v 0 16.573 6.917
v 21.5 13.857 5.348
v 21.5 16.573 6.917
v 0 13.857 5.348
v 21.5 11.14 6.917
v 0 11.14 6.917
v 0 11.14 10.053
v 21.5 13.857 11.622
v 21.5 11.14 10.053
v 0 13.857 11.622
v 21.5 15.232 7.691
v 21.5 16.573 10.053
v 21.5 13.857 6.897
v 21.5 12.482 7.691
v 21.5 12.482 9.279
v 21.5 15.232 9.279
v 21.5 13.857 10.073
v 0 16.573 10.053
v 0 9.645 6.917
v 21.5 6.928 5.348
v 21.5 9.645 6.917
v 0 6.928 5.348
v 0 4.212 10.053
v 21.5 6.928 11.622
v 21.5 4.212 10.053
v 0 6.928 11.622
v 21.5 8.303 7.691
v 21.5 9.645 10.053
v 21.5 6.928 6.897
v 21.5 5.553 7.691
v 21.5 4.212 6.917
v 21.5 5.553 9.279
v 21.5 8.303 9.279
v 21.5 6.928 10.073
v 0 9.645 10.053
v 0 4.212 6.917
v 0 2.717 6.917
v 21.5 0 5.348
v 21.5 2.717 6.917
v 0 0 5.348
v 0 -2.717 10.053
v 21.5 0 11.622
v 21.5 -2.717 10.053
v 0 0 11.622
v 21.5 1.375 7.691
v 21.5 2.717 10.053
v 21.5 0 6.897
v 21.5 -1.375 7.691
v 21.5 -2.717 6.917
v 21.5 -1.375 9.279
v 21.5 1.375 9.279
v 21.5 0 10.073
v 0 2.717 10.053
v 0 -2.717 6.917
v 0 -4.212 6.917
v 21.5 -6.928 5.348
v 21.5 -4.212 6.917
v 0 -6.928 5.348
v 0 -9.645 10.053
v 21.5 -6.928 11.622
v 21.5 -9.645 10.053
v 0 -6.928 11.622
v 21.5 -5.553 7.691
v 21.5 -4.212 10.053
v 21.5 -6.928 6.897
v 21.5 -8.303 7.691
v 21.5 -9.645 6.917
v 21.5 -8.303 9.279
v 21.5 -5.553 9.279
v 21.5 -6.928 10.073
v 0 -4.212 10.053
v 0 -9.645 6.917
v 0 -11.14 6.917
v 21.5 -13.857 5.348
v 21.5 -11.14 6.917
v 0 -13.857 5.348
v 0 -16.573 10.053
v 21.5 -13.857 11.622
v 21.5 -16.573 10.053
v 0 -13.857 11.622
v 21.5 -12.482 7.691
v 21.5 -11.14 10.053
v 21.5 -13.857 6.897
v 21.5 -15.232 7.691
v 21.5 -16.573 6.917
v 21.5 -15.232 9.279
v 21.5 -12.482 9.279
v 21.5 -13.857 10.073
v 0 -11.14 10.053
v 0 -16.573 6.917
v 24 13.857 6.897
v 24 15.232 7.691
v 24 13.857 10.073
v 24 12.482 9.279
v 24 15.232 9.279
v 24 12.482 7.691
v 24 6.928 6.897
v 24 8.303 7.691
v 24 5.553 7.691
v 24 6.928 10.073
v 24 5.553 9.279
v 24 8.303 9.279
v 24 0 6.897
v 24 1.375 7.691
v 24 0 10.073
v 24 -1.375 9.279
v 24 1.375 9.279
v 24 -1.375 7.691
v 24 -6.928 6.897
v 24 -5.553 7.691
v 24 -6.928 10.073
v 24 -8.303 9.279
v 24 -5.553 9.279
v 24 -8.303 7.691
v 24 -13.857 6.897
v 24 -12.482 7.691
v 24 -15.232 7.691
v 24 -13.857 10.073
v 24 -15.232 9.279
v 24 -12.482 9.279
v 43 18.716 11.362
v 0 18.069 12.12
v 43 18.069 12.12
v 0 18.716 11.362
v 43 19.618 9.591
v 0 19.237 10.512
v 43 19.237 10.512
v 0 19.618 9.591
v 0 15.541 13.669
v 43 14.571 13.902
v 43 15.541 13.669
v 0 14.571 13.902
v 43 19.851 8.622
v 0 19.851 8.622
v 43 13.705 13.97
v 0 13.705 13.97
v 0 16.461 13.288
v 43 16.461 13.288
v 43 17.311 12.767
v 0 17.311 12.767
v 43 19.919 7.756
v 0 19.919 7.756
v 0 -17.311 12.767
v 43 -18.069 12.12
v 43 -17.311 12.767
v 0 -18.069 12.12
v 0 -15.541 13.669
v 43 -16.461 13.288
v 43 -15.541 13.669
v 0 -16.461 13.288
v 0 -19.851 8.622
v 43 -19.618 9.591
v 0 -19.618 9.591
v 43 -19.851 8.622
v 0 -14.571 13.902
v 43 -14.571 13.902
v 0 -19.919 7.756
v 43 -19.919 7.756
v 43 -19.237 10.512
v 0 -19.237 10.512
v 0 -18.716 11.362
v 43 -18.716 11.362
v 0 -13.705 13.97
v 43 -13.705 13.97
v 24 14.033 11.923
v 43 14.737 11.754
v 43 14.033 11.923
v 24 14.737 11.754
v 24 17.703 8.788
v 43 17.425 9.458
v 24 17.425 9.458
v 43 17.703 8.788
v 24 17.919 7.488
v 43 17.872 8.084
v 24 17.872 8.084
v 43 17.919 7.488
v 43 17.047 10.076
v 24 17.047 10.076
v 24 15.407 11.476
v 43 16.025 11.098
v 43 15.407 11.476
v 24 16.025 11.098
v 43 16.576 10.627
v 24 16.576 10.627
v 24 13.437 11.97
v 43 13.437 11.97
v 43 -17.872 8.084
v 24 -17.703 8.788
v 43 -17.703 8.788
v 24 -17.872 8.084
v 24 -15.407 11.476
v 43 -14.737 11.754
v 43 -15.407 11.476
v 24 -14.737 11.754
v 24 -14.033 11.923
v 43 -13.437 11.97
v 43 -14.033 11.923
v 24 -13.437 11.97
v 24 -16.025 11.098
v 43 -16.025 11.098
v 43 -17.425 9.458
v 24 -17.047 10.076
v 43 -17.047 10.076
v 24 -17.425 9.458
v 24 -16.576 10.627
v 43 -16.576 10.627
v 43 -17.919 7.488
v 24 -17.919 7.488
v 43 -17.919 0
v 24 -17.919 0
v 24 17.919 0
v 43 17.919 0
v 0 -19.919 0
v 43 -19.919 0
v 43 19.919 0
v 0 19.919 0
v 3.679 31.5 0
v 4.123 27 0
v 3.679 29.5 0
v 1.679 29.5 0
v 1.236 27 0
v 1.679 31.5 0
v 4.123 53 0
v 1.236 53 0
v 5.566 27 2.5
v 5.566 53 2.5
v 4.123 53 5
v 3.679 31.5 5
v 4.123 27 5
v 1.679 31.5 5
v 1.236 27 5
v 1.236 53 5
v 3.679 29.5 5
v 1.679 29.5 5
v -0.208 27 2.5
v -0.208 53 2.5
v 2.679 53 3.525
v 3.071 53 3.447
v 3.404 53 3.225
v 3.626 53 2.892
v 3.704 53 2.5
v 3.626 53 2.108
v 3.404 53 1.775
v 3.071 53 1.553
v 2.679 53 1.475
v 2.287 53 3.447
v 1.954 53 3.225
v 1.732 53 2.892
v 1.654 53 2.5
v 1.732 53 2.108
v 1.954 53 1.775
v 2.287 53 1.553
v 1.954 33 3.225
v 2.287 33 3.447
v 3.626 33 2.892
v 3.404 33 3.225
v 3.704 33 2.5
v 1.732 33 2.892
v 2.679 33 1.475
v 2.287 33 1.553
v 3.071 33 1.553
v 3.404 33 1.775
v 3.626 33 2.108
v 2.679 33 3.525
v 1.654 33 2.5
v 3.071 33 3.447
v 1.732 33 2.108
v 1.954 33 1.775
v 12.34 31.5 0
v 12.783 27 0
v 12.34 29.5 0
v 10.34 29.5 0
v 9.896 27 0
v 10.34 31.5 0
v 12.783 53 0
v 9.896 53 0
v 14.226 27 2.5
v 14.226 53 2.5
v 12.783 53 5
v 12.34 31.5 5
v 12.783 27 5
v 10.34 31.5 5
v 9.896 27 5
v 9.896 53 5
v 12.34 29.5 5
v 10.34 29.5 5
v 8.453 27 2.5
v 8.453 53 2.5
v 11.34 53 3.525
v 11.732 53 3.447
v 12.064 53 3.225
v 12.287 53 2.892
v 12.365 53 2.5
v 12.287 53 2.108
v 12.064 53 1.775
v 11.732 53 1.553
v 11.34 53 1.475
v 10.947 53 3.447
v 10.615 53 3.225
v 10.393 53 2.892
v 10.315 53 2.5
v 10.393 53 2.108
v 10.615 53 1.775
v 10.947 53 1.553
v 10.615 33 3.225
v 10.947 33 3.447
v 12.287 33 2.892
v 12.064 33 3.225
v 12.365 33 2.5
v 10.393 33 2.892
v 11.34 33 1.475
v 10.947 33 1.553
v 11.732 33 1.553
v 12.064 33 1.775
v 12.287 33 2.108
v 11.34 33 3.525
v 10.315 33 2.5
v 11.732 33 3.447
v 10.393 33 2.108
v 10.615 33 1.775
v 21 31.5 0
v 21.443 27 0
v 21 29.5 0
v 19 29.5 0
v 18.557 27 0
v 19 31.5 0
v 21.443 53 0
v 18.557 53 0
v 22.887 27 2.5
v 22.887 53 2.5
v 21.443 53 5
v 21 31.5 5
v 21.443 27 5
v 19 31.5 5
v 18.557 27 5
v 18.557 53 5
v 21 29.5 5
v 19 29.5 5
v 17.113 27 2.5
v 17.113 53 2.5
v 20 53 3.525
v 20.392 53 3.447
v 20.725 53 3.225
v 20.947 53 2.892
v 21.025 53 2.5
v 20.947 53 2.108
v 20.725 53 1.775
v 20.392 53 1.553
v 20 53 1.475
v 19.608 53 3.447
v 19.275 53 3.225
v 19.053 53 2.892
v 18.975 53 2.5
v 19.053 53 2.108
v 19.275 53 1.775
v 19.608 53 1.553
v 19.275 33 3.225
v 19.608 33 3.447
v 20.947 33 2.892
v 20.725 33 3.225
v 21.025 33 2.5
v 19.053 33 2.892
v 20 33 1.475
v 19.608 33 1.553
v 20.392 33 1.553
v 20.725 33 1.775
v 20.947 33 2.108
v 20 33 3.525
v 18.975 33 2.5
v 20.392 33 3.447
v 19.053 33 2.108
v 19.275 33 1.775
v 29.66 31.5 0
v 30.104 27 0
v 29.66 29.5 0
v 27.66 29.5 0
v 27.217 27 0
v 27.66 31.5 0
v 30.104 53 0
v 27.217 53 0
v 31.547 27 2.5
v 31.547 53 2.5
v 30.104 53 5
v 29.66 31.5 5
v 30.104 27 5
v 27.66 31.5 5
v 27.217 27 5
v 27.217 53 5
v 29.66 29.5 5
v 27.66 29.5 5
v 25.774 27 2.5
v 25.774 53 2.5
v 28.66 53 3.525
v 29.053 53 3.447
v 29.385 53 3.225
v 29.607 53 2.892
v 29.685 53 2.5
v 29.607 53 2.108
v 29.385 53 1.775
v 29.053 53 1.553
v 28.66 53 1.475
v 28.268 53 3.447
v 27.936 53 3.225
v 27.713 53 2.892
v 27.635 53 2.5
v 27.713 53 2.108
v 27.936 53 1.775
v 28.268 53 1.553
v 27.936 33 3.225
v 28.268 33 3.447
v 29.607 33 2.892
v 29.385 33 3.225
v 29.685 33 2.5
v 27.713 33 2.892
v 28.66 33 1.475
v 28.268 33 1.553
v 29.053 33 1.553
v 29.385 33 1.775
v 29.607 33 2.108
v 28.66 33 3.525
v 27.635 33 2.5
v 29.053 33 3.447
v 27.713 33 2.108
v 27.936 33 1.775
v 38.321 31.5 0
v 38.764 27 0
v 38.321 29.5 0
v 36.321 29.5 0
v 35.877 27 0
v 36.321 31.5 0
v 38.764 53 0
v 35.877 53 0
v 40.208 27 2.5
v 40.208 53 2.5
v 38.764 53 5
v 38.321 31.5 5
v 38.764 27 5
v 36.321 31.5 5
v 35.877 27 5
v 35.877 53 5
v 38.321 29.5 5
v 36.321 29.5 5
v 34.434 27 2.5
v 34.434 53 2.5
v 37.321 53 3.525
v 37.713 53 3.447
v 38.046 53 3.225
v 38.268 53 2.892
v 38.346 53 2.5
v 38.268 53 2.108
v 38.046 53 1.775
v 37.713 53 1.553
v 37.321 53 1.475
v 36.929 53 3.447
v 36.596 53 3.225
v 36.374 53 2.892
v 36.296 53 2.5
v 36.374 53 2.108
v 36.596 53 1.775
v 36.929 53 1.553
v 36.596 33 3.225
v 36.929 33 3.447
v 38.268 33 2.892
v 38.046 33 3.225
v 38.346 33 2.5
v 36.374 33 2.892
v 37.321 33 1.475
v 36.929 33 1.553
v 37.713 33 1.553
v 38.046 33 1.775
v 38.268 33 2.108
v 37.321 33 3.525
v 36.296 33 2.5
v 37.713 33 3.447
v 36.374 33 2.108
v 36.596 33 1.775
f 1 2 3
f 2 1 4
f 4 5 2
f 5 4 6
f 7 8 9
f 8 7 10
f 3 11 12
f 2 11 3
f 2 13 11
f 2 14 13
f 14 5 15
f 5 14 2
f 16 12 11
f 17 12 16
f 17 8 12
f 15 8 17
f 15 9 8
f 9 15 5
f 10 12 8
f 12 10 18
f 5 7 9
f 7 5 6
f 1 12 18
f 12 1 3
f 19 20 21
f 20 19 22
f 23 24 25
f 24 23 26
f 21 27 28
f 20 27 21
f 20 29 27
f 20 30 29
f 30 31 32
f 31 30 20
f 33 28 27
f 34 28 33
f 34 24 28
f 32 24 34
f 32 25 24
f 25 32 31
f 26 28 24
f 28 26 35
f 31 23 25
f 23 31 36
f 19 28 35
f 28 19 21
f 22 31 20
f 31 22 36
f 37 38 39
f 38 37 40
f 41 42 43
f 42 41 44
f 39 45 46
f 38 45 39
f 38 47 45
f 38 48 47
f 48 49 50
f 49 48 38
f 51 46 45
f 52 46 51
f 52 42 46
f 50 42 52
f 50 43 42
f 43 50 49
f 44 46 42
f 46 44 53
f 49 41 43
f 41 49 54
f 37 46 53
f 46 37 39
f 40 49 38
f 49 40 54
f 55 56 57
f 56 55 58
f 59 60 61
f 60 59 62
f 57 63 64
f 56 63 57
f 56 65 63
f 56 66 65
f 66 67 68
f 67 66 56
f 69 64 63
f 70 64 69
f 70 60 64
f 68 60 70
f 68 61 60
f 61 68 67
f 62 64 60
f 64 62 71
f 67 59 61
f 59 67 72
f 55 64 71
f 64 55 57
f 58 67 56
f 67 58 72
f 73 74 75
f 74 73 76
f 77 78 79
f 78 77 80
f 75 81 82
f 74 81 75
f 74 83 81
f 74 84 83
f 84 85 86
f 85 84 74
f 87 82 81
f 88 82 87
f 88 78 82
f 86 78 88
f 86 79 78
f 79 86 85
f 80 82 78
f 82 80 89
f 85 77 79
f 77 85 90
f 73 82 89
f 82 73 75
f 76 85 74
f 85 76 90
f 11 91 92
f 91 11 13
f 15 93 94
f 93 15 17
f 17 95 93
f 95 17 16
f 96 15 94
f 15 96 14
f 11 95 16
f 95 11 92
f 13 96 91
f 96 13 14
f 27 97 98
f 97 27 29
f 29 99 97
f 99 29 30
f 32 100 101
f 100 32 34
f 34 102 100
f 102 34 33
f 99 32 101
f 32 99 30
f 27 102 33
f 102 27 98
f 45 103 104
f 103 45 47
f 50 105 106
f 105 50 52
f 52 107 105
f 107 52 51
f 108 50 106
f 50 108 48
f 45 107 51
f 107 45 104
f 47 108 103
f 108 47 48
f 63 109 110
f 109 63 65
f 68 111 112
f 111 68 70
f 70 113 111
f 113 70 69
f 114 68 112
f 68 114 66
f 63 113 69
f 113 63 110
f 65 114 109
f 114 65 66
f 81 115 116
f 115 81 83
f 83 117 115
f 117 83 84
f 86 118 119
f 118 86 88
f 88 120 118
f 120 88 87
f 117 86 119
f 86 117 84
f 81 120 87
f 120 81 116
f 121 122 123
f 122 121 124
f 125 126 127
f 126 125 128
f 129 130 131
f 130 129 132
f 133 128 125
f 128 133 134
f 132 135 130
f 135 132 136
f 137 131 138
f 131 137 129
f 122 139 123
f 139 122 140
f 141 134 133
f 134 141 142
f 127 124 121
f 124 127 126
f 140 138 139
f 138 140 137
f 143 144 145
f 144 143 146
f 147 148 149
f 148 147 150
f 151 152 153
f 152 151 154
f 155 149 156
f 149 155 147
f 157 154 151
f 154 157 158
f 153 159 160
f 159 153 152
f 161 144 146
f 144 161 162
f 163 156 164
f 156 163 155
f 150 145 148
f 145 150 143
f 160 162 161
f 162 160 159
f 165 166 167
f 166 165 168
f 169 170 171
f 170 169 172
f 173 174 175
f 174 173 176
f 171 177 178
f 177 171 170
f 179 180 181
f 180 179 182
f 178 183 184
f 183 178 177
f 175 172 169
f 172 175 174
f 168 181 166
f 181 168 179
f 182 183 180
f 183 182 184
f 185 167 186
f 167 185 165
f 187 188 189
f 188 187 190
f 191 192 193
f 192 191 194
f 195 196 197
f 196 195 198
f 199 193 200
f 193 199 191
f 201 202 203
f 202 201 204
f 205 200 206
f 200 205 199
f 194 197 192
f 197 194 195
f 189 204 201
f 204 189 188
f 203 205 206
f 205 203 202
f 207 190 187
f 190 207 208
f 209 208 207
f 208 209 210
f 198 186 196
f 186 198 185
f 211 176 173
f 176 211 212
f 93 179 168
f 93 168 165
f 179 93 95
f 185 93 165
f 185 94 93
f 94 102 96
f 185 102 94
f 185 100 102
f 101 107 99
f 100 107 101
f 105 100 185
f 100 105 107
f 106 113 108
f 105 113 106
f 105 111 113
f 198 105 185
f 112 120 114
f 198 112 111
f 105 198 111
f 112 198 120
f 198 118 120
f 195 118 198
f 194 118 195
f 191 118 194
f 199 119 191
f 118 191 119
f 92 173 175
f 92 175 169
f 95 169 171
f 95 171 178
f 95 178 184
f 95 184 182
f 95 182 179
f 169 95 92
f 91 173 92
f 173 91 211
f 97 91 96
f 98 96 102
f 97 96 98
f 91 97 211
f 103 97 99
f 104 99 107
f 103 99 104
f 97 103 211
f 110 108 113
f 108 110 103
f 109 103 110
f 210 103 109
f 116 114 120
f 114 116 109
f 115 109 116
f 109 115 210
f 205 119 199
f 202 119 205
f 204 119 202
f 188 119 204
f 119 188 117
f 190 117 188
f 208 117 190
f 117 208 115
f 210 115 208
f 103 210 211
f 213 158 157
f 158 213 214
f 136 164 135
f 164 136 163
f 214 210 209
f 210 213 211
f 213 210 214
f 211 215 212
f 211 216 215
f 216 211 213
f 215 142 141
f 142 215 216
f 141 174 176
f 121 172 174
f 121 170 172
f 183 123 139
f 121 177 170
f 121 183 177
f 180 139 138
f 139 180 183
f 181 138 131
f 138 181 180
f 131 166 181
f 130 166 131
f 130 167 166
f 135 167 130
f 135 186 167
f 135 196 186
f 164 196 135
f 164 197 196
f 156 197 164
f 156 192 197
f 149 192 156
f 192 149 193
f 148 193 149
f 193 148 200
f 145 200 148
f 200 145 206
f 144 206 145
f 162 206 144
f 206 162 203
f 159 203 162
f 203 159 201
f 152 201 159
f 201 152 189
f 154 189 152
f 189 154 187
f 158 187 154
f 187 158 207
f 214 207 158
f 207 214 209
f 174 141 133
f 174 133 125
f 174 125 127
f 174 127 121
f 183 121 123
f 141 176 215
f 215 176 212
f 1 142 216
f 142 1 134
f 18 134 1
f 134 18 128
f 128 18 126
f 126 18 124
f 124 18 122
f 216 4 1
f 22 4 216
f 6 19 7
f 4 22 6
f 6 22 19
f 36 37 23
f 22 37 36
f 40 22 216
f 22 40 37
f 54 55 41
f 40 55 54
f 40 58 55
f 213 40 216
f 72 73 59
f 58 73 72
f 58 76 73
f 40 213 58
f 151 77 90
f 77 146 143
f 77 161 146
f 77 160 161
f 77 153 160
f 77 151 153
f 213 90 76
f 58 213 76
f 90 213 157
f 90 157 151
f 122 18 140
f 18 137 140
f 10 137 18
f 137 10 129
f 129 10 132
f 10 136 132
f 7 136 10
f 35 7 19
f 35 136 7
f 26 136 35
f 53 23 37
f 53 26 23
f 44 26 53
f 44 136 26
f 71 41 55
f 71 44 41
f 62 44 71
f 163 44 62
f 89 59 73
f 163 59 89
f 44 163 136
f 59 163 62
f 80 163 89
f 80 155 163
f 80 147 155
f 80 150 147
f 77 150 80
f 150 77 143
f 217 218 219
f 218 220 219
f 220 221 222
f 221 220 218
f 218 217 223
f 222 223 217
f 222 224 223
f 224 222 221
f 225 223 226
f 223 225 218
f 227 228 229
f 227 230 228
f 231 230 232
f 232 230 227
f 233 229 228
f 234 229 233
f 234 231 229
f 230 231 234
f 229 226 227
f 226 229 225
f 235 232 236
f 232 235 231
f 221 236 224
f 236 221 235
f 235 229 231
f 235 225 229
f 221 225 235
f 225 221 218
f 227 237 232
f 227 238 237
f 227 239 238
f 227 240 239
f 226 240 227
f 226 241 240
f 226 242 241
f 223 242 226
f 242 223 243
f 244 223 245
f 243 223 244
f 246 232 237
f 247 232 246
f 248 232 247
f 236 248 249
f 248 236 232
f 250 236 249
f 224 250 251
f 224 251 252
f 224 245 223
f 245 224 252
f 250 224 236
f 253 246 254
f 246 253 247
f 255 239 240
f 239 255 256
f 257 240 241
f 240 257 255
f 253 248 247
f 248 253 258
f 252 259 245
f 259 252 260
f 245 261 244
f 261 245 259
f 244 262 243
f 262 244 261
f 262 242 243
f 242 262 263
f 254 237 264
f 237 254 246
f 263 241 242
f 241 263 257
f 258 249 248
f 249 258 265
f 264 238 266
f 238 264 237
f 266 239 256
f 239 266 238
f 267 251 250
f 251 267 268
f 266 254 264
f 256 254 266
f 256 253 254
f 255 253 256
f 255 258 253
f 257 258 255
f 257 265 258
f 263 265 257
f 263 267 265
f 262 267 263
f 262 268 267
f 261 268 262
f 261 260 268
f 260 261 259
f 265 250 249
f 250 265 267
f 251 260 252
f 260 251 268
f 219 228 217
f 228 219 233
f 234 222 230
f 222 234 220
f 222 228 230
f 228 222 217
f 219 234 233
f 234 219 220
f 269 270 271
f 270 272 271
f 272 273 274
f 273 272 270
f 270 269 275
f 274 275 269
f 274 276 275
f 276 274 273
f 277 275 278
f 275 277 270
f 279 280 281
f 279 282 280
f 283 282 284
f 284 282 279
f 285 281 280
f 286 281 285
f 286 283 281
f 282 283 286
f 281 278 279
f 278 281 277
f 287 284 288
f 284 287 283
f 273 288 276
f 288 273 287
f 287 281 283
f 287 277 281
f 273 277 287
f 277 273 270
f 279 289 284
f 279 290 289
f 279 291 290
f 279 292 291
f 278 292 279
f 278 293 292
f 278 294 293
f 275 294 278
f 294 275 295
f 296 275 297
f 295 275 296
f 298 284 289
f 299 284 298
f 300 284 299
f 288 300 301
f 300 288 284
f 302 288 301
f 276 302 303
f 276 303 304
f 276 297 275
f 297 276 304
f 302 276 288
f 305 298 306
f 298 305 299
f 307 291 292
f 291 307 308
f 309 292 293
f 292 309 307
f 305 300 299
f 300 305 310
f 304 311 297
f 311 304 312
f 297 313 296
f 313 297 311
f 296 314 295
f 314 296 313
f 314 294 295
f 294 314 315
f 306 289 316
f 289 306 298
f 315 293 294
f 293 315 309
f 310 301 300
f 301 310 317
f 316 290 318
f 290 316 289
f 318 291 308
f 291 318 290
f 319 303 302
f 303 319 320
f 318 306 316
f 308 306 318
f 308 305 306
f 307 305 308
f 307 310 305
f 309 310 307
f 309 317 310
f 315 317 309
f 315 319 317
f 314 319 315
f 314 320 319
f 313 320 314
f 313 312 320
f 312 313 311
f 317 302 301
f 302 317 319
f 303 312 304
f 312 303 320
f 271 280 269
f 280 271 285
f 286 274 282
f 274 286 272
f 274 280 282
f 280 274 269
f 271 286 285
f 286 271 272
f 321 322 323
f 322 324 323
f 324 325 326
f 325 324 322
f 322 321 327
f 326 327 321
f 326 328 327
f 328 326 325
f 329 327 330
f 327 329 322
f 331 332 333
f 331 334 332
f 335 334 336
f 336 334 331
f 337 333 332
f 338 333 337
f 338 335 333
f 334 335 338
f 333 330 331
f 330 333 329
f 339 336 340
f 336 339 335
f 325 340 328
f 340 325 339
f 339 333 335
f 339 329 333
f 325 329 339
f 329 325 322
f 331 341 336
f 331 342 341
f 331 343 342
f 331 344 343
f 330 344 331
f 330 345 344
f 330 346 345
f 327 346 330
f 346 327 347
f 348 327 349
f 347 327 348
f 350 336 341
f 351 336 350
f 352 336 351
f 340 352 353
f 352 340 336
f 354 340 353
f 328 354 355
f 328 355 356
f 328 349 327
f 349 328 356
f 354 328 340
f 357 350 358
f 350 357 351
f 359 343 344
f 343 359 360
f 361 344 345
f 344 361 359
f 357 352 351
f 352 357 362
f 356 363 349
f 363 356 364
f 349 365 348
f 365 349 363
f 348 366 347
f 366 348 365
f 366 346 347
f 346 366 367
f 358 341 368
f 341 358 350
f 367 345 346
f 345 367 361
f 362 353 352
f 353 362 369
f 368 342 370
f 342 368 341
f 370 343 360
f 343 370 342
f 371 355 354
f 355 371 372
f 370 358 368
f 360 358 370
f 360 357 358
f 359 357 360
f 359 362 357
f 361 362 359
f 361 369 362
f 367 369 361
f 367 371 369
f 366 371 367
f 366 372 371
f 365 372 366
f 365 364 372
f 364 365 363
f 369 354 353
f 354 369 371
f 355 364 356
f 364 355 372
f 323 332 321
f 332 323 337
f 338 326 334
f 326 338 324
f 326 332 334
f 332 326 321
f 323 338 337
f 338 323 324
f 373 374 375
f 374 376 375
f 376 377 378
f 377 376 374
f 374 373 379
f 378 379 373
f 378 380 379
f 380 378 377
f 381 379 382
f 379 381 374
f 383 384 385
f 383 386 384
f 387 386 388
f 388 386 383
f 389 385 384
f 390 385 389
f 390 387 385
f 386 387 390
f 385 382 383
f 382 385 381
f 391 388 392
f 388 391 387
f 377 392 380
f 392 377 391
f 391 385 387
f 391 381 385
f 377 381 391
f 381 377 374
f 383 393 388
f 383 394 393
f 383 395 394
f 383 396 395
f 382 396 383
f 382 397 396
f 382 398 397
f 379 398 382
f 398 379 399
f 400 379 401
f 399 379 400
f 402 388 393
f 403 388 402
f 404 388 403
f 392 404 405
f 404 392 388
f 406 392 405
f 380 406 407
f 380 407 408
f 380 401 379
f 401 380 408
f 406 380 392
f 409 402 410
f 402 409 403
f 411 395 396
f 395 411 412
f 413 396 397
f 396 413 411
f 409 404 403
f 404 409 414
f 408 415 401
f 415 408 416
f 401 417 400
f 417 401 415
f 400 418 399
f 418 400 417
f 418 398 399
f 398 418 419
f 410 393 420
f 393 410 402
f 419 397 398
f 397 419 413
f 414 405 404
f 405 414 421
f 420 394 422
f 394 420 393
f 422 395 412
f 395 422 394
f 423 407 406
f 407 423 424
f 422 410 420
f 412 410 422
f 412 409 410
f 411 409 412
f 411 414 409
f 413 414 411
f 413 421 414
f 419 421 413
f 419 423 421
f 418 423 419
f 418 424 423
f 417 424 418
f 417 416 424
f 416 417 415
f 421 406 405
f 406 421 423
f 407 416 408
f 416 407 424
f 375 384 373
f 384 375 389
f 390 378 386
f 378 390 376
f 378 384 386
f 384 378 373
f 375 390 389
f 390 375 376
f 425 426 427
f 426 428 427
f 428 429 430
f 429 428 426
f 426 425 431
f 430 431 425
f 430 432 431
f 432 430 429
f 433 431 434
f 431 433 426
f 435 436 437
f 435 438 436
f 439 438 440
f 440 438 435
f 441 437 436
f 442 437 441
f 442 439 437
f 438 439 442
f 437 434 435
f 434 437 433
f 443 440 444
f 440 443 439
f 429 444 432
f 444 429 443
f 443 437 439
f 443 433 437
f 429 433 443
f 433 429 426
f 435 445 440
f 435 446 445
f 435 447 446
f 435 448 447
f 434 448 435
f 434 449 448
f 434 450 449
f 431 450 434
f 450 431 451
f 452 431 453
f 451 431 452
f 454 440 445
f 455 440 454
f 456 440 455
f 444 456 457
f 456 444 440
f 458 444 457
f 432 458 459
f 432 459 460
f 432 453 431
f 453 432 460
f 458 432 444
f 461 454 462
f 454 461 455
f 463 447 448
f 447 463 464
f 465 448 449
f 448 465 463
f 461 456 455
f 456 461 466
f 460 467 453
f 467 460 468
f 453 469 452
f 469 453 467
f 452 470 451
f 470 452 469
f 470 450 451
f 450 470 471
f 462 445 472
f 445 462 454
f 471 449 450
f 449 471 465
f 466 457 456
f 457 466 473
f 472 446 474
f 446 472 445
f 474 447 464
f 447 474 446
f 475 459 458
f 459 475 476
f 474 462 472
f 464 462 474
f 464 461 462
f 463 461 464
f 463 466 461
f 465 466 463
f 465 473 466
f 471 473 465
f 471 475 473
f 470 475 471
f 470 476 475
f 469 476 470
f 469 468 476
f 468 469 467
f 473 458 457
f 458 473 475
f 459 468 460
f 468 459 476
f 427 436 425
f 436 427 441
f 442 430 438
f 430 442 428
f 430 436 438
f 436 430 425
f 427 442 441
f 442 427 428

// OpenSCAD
/*

Parametric Prosthetic Hand String Tensioner
Based on a part designed by Ivan Owen
Put into parametric format by David Orgeman

Released under the terms of the GNU GPL v3.0 

This program is free software: you can redistribute it and/or modify
it under the terms of the GNU General Public License as published by
the Free Software Foundation, either version 3 of the License, or
(at your option) any later version.

This program is distributed in the hope that it will be useful,
but WITHOUT ANY WARRANTY; without even the implied warranty of
MERCHANTABILITY or FITNESS FOR A PARTICULAR PURPOSE. See the
GNU General Public License for more details.

You should have received a copy of the GNU General Public License
along with this program. If not, see <http://www.gnu.org/licenses/>.

*/


Metric_Table=[ 	["M2", 0.8000, 1.1000, 2.3094], 
				["M25", 1.0250, 1.3750, 2.8868], 
				["M3", 1.2500, 1.6500, 3.1754], 
				["M4", 1.6500, 2.2000, 4.0415], 
				["M5", 2.1000, 2.7500, 4.6188]  ];


//Standard hole sizes for tapping into plastic
//M2T=1.60;
//M25T=2.05;
//M3T=2.5;
//M4T=3.3;
//M5T=4.2;

//Standard hole sizes for metric screws
//M2=2.2;
//M25=2.75;
//M3=3.3;
//M4=4.4;
//M5=5.5;

//Standard nut sizes - flat-to-flat and then as radius
//M2NutW=4.0;
//M25NutW=5.0;
//M3NutW=5.5;
//M4NutW=7.0;
//M5NutW=8.0;
//M2NutR=(M2NutW/cos(30))/2;
//M25NutR=(M25NutW/cos(30))/2;
//M3NutR=(M3NutW/cos(30))/2;
//M4NutR=(M4NutW/cos(30))/2;
//M5NutR=(M5NutW/cos(30))/2;


//PARAMETERS

//size of the tuner drive screws
Tuner_Size="M25";//[ M2, M25, M3, M4, M5 ]

Metric_Index=search([Tuner_Size], Metric_Table)[0];
Tuner_Screw_Radius=Metric_Table[Metric_Index][1];
Block_Screw_Radius=Metric_Table[Metric_Index][2];
Rod_Radius=Metric_Table[Metric_Index][3];

//extra elevation of the tuners and strings above the gauntlet
Extra_Tuner_Height=0.0;

//slightly increase the length of rods and tuner block for springs
Spring_Length_Adjustment=3.0;

//length of the spring covering shell on the back of the tuner
Spring_Shield_Adjustment=19.0;

//functional length of the tuner rods
Rod_Length=18.0;

//extra tuner rod length to tie the strings to.
Extra_Tuner_Length=5.0;

//size of the hole through the tuners for the drive strings
String_Radius=1.0;

//number of tuners - most will want 5, some might want 4
Tuner_Count=5;//[1, 2, 3, 4, 5]

//extra gap in the tuner slots to allow them to slide more readily
Tuner_Fit=0.25;


//0 to print tuners, 1 to omit them
Print_Tuners=0;//[0, 1]

//0 to print the block, 1 to omit it
Print_Block=0;//[0, 1]


//RENDER
if (Print_Block == 0)
	{
	translate([0, 0, 3])
		block();
	}
	

if (Print_Tuners == 0)
	{
	if (Tuner_Count>0)
		{
		for(i=[1:Tuner_Count])
			{
			translate([20-3*Rod_Radius*(Tuner_Count+1)/2 + 3*Rod_Radius*i, 40, 0])
				tuner();
			}
		}
	}


module block()
	{
	rotate(a=[0, 0, -90])
	difference()
		{
		translate([-2.3*Rod_Radius*(Tuner_Count+1)/2, 0, -3])
			cube([4.6*Rod_Radius*(Tuner_Count+1)/2, Rod_Length+3+Spring_Length_Adjustment+Spring_Shield_Adjustment, 3.8*Rod_Radius+Extra_Tuner_Height+3]);
									
		for(i=[1:Tuner_Count])
			{
			translate([-2.4*Rod_Radius*(Tuner_Count+1)/2 + 2.4*Rod_Radius*i, Rod_Length+0.5+Spring_Length_Adjustment, 1.9*Rod_Radius+Extra_Tuner_Height])
				rotate(a=[0, 30, 0])
				rotate(a=[90, 0, 0])
					cylinder(h=Rod_Length+2+Spring_Length_Adjustment, r=Rod_Radius+Tuner_Fit, $fn=6);
			}

		for(i=[1:Tuner_Count])
			{
			translate([-2.4*Rod_Radius*(Tuner_Count+1)/2 + 2.4*Rod_Radius*i, 50, 1.9*Rod_Radius+Extra_Tuner_Height])
				rotate(a=[0, 30, 0])
				rotate(a=[90, 0, 0])
					cylinder(h=100, r=Block_Screw_Radius/cos(30), $fn=6);
			}
		
		translate([-2.3*Rod_Radius*(Tuner_Count+1)/2-0.01, 0, 3.8*Rod_Radius+Extra_Tuner_Height+0.01])
			rotate(a=[-90, 0, 0])
				fillet(r=2.2*Rod_Radius, h=200);
		translate([2.3*Rod_Radius*(Tuner_Count+1)/2+0.01, 0, 3.8*Rod_Radius+Extra_Tuner_Height+0.01])
			rotate(a=[0, 90, 0])
			rotate(a=[-90, 0, 0])
				fillet(r=2.2*Rod_Radius, h=200);

		difference()
			{
			translate([-2.3*Rod_Radius*(Tuner_Count+1)/2+2, Rod_Length+3+Spring_Length_Adjustment, -6])
				cube([4.6*Rod_Radius*(Tuner_Count+1)/2-4, Spring_Shield_Adjustment+2, 3.8*Rod_Radius+Extra_Tuner_Height+6-2]);
			translate([-2.3*Rod_Radius*(Tuner_Count+1)/2+2-0.01, 0, 3.8*Rod_Radius+Extra_Tuner_Height-2+0.01])
				rotate(a=[-90, 0, 0])
					fillet(r=1.6*Rod_Radius, h=200);
			translate([2.3*Rod_Radius*(Tuner_Count+1)/2-2+0.01, 0, 3.8*Rod_Radius+Extra_Tuner_Height-2+0.01])
				rotate(a=[0, 90, 0])
				rotate(a=[-90, 0, 0])
					fillet(r=1.6*Rod_Radius, h=200);
			}

		}	
	}	
	
	
module tuner()
	{
	translate([0, (Rod_Length+Extra_Tuner_Length+Spring_Length_Adjustment)/2, Rod_Radius*cos(30)])
	difference()
		{
		rotate(a=[90, 0, 0])
			cylinder(h=Rod_Length+Extra_Tuner_Length+Spring_Length_Adjustment, r=Rod_Radius, $fn=6);
		translate([0, 1, 0])
			rotate(a=[90, 0, 0])
				cylinder(h=Rod_Length+Spring_Length_Adjustment, r=Tuner_Screw_Radius, $fn=16);
		translate([-String_Radius, -Rod_Length-Spring_Length_Adjustment-Extra_Tuner_Length/2, -10])
//			polyhole(h=20, d=String_Radius*2);
//			cylinder(h=20, r=String_Radius, center=true);
			cube([2*String_Radius, 2*String_Radius, 20]);
		}
	}


	
module fillet(r, h) 
	{
	translate([r/2, r/2, 0])
		difference() 
			{
			cube([r, r, h], center=true);
			translate([r/2, r/2, 0])
				cylinder(h=h+1, r=r, center=true, $fn=40);
			}
	}

	
	
// By nophead
module polyhole(d, h) 
	{
	n=max(round(2*d), 3);
	rotate(v=[0, 0, 180])
		cylinder(h=h, r=(d/2)/cos(180/n), center=true, $fn=n);
	}
